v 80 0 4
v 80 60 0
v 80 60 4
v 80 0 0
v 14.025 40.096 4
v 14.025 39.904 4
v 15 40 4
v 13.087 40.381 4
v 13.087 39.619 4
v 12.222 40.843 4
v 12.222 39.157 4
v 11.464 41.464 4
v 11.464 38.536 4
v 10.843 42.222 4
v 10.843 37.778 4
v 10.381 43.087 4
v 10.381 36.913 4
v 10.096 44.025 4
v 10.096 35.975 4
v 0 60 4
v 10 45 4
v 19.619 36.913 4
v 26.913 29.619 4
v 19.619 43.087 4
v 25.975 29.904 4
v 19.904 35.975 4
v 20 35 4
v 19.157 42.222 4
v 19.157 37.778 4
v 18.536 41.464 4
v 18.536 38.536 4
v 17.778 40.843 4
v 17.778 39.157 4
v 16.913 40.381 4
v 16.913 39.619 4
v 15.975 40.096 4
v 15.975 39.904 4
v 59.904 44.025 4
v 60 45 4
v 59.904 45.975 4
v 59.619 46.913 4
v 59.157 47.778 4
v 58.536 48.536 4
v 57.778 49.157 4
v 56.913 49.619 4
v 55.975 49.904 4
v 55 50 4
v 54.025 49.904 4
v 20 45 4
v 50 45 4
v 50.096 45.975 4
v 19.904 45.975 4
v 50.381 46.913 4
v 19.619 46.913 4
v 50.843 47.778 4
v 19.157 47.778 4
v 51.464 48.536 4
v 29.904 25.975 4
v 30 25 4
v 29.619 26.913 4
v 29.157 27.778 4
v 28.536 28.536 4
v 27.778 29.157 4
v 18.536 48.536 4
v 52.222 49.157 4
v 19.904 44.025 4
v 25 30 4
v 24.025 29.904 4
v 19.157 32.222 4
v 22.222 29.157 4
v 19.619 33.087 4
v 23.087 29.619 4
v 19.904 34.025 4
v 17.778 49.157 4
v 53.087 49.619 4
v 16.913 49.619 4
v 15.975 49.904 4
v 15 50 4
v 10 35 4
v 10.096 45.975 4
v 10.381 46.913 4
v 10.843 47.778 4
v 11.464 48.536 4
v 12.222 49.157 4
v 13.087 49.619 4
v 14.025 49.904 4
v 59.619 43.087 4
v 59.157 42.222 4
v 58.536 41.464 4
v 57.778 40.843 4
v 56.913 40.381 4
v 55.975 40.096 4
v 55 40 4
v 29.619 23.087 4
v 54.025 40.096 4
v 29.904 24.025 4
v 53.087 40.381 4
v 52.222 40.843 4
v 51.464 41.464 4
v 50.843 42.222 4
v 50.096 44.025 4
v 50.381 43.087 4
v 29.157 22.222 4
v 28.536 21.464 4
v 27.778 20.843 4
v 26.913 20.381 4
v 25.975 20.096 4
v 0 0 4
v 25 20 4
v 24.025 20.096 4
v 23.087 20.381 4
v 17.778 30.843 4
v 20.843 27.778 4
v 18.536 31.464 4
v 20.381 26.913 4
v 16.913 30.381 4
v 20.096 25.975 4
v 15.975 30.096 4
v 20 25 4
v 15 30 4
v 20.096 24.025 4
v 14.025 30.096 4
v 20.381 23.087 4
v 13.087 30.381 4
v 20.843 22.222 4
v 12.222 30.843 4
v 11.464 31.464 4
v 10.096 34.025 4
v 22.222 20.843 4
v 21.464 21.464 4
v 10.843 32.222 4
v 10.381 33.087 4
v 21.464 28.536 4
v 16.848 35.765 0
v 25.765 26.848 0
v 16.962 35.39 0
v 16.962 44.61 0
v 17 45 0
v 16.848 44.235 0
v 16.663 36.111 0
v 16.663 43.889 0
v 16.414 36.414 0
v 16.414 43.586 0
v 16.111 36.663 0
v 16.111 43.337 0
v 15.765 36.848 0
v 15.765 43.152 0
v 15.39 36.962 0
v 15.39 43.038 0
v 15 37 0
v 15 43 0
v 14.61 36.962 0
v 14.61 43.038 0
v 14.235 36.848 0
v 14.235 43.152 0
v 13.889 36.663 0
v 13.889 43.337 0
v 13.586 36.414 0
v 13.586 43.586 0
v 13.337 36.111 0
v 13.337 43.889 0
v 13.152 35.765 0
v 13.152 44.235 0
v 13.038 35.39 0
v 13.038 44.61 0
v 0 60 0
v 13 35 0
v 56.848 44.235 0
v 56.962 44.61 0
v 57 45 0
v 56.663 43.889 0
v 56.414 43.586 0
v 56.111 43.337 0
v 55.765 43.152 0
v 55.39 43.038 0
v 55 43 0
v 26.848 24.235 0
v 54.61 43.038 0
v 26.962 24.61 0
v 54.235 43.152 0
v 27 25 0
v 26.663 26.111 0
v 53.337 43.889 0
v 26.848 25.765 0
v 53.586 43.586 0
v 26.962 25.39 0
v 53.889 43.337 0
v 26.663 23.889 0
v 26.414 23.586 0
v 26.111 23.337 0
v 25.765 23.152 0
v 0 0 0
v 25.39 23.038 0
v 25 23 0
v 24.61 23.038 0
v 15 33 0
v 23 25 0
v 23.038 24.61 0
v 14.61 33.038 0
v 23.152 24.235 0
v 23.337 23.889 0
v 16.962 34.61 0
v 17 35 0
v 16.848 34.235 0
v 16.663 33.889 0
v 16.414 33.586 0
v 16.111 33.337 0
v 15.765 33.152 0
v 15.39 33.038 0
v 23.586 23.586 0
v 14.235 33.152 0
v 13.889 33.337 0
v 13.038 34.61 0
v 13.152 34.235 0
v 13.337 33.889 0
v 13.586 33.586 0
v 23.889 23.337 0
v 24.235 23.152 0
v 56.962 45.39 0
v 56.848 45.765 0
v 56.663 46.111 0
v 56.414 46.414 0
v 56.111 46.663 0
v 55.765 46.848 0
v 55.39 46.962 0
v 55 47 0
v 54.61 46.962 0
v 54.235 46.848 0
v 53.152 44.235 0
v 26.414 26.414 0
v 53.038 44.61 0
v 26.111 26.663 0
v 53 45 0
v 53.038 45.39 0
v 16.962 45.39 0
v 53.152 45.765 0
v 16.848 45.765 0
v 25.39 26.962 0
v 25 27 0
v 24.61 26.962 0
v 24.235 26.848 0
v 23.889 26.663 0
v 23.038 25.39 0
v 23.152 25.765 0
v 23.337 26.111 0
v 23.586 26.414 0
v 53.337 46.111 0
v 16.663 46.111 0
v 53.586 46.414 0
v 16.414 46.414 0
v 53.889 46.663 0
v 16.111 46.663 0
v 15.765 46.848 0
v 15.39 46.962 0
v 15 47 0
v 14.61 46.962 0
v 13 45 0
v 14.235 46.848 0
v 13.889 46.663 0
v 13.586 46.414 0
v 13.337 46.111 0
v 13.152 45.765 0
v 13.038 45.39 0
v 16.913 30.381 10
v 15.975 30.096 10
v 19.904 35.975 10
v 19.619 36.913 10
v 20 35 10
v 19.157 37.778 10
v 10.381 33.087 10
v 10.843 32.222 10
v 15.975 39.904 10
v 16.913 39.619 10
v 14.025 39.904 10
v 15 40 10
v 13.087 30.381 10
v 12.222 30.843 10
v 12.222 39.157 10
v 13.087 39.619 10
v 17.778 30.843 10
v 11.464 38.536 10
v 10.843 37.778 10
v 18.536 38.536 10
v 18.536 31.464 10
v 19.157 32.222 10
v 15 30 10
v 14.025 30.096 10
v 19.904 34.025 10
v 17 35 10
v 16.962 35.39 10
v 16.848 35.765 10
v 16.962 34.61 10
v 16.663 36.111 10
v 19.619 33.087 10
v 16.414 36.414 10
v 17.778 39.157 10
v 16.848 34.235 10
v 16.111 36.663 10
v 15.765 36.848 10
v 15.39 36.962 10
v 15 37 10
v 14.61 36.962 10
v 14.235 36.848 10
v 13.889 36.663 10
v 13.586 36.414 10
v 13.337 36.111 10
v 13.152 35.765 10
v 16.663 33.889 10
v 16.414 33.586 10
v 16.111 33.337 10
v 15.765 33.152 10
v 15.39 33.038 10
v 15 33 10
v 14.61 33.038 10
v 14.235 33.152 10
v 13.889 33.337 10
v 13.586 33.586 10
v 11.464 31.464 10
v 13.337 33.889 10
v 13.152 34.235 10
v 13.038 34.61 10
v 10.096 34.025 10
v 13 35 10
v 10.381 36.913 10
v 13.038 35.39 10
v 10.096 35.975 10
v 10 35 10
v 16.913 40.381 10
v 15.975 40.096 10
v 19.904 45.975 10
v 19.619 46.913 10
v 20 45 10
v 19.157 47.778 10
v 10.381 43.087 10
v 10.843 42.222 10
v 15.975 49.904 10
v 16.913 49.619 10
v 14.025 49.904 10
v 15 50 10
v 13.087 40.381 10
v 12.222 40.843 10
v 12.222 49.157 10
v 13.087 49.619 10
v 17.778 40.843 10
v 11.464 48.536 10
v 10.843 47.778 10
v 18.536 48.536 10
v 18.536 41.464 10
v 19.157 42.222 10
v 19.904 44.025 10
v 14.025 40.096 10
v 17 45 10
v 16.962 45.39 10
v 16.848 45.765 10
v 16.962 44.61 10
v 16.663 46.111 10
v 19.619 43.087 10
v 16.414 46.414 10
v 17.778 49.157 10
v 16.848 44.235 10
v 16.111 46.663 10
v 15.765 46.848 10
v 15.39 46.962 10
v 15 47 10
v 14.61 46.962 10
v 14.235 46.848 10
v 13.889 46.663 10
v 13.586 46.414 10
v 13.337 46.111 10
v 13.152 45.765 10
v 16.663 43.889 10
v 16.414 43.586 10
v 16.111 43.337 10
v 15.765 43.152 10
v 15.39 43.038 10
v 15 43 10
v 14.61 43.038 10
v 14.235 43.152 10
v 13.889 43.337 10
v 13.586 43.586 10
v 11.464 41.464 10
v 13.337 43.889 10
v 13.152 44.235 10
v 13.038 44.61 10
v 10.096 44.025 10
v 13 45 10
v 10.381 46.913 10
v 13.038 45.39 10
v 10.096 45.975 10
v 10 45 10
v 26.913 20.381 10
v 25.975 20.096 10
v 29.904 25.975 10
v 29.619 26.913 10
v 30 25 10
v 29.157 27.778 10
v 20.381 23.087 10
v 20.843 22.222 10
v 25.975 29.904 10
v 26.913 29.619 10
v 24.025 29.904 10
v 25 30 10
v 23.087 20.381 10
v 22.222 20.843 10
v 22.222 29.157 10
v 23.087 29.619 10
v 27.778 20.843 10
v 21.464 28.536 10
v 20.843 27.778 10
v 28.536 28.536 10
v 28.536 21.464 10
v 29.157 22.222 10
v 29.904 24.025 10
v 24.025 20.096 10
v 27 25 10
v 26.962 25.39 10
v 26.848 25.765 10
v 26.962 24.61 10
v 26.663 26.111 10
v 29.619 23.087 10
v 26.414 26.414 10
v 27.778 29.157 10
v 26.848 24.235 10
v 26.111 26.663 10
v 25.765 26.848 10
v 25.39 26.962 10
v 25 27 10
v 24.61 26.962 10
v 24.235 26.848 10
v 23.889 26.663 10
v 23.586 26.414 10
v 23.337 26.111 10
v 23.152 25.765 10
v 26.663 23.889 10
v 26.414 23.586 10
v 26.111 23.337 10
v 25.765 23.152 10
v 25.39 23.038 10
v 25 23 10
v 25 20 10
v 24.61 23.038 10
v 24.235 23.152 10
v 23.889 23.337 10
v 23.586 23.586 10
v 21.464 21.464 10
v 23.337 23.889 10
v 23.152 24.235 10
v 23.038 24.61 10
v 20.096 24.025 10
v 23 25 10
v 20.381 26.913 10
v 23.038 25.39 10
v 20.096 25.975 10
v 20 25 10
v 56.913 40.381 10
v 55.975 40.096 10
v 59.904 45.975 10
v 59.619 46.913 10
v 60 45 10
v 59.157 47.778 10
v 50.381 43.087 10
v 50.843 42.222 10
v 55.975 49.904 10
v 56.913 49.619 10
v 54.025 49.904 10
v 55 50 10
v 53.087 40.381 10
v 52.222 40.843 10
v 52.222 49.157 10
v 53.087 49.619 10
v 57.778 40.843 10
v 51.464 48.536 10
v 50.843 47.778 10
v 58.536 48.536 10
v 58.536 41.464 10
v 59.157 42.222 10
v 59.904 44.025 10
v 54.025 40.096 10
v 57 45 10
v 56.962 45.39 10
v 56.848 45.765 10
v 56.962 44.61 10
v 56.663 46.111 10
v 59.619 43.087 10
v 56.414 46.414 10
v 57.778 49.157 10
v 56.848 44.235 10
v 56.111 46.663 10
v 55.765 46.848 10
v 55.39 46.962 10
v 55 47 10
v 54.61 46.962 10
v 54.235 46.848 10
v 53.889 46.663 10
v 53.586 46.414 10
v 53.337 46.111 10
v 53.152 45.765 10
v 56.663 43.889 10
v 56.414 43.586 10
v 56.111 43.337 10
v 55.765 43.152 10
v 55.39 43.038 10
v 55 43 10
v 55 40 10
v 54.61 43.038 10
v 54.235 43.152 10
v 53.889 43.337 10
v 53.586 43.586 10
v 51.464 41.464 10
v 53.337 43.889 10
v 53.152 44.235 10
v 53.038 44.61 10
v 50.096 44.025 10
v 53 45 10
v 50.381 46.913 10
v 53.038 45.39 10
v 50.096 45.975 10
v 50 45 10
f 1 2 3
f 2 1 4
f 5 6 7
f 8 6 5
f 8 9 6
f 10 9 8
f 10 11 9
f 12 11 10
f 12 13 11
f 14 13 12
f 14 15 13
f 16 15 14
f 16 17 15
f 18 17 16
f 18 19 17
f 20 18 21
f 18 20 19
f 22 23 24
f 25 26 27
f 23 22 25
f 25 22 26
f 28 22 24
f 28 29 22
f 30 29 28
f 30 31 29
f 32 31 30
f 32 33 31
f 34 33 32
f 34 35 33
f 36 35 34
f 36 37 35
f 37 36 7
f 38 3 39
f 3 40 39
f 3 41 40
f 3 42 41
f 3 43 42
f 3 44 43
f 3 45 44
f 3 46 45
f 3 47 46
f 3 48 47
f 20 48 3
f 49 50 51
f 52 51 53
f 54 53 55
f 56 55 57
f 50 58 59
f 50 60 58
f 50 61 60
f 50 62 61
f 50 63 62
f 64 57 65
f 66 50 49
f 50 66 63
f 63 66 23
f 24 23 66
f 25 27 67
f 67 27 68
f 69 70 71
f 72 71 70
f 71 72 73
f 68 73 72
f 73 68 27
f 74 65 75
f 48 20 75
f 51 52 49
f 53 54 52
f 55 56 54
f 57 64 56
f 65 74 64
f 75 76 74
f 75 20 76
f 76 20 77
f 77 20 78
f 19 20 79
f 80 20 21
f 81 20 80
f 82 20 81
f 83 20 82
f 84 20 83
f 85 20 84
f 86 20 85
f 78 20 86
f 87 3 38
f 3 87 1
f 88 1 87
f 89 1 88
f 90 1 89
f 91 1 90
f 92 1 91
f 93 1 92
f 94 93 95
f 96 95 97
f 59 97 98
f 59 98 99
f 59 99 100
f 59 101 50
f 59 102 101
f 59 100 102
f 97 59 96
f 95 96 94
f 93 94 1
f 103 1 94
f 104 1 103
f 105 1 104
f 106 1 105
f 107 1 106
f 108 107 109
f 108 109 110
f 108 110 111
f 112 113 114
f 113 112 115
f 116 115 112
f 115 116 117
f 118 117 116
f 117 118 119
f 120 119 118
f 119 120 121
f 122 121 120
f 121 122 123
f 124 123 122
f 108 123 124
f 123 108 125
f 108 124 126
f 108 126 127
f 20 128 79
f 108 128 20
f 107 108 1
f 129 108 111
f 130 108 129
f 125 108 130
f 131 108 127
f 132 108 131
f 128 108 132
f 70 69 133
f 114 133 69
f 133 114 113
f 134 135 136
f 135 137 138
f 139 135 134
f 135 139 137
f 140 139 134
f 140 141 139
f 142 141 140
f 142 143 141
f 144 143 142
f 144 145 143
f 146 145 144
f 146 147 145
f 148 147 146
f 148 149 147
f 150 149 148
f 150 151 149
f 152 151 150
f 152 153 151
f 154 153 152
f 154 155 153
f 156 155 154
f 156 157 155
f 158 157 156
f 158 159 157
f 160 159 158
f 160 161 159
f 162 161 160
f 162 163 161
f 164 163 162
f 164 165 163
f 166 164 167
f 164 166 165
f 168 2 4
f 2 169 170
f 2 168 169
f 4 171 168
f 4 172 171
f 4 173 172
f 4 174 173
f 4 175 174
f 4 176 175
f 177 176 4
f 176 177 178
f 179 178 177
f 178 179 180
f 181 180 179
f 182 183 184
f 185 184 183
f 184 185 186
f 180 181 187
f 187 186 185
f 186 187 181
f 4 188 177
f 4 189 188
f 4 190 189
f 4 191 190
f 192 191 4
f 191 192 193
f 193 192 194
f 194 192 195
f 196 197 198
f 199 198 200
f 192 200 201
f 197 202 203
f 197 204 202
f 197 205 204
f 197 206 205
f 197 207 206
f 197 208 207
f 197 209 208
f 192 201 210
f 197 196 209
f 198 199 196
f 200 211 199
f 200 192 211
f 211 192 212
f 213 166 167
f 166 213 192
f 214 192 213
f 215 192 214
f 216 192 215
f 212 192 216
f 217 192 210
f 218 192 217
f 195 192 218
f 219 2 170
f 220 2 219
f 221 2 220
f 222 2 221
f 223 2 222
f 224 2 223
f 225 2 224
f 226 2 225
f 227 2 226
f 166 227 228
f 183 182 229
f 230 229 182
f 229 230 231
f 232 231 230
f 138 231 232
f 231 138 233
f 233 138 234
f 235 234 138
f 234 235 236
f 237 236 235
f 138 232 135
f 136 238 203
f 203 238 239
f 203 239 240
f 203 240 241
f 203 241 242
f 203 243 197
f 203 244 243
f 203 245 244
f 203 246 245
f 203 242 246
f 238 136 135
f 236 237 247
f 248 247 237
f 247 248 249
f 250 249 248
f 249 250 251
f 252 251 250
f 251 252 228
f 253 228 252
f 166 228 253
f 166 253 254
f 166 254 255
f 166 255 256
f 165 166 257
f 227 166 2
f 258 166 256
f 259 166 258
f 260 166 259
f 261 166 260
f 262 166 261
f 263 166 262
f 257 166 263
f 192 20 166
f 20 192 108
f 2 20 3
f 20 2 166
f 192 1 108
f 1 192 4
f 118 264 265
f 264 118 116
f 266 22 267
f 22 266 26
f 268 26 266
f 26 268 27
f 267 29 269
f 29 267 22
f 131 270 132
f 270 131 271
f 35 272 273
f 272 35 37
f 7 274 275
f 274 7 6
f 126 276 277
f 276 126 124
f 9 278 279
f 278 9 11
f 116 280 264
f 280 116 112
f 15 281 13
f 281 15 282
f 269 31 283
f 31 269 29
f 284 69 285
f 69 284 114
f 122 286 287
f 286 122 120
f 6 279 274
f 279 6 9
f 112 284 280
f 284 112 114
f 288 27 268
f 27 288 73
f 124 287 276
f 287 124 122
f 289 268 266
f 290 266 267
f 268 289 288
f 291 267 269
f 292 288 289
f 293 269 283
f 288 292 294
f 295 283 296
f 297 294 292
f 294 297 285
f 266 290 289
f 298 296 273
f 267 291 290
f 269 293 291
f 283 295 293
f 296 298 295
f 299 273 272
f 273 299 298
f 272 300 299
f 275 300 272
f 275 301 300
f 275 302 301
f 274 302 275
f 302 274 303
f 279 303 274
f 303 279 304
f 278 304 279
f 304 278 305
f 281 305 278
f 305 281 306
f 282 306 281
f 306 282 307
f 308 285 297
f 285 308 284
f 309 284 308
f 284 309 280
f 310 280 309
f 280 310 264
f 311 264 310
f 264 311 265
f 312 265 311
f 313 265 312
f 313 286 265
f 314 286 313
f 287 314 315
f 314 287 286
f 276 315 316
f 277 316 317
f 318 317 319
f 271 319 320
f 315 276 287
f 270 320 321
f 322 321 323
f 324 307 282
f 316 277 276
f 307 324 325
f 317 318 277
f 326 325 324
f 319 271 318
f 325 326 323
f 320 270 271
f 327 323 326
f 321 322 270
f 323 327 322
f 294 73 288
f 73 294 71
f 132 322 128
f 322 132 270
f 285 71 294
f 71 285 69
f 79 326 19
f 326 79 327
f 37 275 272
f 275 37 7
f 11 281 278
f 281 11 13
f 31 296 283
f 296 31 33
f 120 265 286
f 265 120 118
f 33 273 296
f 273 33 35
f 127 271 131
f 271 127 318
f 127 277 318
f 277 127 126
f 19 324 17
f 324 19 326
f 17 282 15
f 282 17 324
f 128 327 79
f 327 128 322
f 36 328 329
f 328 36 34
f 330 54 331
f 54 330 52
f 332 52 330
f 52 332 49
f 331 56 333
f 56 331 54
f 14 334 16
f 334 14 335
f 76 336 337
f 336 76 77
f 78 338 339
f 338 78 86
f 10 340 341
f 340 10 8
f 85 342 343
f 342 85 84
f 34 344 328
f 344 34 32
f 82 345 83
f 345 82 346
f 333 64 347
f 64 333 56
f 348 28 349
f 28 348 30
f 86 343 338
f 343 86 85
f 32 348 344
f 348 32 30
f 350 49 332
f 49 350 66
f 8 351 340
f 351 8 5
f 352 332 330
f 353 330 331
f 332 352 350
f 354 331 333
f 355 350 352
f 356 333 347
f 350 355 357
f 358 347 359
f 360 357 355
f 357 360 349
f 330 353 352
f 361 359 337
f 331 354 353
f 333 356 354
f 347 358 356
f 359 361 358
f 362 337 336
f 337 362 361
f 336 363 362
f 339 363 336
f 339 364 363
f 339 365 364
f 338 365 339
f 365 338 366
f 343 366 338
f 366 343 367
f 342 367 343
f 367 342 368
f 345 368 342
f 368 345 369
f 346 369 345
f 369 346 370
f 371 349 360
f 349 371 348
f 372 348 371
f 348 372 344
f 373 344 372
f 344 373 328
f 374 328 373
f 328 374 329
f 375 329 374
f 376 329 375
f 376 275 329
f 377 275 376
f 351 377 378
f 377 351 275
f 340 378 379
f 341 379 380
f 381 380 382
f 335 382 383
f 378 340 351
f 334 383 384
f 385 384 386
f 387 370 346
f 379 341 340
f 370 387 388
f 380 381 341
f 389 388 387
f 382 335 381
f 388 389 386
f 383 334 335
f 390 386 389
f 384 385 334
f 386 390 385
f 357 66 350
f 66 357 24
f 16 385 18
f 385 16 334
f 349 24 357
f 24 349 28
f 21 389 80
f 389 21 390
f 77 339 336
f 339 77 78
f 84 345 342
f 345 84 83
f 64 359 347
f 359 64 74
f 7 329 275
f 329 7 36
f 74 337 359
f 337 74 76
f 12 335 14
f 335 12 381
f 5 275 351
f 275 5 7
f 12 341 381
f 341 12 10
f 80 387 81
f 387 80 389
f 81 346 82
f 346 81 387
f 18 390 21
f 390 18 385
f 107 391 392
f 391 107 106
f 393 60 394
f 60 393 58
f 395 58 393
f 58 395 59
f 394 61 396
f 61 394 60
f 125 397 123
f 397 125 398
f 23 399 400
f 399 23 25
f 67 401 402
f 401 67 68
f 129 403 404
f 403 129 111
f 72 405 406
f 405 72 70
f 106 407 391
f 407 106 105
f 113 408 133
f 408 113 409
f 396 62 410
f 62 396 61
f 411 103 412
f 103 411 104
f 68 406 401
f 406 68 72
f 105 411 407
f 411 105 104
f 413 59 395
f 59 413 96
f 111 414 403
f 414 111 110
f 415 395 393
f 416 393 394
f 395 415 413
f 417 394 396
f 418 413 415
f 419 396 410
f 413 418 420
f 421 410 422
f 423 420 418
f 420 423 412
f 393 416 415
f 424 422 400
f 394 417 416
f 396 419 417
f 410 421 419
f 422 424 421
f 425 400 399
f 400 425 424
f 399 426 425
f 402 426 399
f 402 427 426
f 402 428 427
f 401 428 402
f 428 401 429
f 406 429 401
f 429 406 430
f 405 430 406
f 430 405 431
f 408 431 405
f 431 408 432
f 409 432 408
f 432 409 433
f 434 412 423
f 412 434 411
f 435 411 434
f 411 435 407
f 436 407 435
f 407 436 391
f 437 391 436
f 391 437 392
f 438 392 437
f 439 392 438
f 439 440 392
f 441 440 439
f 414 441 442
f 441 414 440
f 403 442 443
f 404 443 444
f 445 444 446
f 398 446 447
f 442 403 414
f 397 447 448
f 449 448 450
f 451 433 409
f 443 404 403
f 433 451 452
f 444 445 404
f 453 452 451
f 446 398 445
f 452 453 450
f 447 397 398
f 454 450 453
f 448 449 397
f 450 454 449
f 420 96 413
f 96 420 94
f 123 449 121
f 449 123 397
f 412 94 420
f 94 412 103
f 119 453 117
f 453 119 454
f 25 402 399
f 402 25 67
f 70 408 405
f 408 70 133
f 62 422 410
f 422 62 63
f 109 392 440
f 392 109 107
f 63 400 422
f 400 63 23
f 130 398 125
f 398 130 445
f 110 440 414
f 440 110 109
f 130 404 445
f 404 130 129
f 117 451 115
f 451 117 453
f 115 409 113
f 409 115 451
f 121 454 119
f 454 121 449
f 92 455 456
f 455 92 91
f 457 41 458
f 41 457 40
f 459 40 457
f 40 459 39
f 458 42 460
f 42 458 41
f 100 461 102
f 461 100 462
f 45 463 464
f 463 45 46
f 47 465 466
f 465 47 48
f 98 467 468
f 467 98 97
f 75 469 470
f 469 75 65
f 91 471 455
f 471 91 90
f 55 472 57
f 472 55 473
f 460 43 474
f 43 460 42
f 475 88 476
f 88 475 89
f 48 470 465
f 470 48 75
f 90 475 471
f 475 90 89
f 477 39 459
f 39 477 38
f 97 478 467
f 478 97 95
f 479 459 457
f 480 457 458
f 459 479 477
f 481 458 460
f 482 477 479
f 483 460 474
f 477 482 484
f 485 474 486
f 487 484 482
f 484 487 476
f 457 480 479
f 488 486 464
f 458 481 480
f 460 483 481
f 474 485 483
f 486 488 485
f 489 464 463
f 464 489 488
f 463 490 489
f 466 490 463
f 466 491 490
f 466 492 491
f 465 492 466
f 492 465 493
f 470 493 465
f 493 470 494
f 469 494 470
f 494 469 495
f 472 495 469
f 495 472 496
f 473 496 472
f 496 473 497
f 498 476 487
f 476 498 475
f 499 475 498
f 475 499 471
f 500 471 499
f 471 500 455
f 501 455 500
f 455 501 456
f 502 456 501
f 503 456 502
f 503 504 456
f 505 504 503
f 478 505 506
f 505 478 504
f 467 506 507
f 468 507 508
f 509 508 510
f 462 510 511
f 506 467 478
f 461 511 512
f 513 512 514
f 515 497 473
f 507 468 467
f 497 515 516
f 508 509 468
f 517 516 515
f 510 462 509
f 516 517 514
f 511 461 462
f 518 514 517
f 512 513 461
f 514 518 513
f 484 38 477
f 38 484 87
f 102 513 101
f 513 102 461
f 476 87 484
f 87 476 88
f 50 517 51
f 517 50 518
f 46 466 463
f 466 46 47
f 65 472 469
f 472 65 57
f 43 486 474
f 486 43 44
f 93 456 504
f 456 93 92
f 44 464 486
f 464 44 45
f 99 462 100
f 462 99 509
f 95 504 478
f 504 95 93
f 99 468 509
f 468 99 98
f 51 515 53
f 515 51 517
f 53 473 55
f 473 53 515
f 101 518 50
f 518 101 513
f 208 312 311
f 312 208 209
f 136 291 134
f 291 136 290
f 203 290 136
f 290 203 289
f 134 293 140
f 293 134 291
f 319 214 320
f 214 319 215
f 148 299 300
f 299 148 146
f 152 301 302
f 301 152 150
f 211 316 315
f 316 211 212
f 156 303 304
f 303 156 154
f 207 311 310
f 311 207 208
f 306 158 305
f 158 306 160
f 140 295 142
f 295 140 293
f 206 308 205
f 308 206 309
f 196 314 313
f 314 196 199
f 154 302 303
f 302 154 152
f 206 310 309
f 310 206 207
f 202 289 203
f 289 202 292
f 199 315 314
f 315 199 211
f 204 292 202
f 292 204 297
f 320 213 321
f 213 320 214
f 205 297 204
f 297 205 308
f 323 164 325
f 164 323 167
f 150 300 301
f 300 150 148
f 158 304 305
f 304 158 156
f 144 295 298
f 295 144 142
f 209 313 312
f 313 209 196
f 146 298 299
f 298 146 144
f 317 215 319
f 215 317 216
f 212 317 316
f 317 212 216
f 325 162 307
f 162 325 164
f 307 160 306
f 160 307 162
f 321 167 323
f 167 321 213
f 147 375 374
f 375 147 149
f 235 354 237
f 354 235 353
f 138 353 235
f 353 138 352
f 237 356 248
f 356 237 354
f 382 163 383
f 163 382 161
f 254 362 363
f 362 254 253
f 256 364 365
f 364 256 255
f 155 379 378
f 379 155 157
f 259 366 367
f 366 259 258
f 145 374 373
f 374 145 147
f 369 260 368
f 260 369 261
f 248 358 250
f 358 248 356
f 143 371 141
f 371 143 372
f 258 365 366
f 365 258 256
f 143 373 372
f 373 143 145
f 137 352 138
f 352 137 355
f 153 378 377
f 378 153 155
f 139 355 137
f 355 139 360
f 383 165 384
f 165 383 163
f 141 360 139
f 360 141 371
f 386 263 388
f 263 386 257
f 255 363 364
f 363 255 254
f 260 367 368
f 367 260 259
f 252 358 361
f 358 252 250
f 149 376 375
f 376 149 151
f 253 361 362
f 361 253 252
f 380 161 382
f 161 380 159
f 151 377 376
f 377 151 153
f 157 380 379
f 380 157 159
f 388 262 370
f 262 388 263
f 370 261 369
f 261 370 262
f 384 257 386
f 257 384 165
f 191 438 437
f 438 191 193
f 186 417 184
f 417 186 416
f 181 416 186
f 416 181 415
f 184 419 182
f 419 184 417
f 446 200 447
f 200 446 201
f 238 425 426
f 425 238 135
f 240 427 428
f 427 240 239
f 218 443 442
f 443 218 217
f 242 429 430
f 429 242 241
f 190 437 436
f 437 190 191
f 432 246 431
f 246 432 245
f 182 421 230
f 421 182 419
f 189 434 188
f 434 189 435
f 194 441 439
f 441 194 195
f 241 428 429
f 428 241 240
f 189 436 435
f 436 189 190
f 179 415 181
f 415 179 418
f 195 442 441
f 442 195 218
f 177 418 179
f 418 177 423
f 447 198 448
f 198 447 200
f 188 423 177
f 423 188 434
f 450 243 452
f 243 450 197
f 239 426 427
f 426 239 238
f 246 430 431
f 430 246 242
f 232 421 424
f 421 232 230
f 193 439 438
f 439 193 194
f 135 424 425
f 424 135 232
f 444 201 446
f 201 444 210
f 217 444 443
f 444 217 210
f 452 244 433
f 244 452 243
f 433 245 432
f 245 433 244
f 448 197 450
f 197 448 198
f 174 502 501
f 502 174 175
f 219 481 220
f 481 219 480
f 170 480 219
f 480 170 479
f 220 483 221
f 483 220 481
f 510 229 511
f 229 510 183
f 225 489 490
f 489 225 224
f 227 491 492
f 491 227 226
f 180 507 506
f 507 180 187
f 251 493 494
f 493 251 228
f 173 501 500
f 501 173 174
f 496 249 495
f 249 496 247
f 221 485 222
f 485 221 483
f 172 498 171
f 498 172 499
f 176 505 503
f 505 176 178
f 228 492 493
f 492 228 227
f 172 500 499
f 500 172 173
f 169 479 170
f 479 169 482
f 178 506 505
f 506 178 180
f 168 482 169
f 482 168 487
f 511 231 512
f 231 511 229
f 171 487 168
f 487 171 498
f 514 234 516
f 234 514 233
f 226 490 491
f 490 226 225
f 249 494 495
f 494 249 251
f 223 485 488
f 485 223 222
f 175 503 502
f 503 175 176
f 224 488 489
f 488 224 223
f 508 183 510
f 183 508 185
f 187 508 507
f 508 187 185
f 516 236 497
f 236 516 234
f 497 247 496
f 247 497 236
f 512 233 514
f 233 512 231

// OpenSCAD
$fn = 32;

// ----------------------------------------------------------------------
// Boss field: plate with bosses at given coordinates
// ----------------------------------------------------------------------

// --- parameters (mm) ---
plate_l = 80;             // plate length, X
plate_w = 60;             // plate width, Y
plate_t = 4;              // plate thickness, Z
boss_d = 10;              // boss diameter
boss_h = 6;               // boss height above the plate
bore_d = 4;               // boss bore

total_h = plate_t + boss_h;  // overall height

difference() {
  union() {
    cube([plate_l, plate_w, plate_t]);
    translate([15, 35, plate_t]) cylinder(h = boss_h, d = boss_d);
    translate([15, 45, plate_t]) cylinder(h = boss_h, d = boss_d);
    translate([25, 25, plate_t]) cylinder(h = boss_h, d = boss_d);
    translate([55, 45, plate_t]) cylinder(h = boss_h, d = boss_d);
  }
  translate([15, 35, -1]) cylinder(h = total_h + 2, d = bore_d);
  translate([15, 45, -1]) cylinder(h = total_h + 2, d = bore_d);
  translate([25, 25, -1]) cylinder(h = total_h + 2, d = bore_d);
  translate([55, 45, -1]) cylinder(h = total_h + 2, d = bore_d);
}
